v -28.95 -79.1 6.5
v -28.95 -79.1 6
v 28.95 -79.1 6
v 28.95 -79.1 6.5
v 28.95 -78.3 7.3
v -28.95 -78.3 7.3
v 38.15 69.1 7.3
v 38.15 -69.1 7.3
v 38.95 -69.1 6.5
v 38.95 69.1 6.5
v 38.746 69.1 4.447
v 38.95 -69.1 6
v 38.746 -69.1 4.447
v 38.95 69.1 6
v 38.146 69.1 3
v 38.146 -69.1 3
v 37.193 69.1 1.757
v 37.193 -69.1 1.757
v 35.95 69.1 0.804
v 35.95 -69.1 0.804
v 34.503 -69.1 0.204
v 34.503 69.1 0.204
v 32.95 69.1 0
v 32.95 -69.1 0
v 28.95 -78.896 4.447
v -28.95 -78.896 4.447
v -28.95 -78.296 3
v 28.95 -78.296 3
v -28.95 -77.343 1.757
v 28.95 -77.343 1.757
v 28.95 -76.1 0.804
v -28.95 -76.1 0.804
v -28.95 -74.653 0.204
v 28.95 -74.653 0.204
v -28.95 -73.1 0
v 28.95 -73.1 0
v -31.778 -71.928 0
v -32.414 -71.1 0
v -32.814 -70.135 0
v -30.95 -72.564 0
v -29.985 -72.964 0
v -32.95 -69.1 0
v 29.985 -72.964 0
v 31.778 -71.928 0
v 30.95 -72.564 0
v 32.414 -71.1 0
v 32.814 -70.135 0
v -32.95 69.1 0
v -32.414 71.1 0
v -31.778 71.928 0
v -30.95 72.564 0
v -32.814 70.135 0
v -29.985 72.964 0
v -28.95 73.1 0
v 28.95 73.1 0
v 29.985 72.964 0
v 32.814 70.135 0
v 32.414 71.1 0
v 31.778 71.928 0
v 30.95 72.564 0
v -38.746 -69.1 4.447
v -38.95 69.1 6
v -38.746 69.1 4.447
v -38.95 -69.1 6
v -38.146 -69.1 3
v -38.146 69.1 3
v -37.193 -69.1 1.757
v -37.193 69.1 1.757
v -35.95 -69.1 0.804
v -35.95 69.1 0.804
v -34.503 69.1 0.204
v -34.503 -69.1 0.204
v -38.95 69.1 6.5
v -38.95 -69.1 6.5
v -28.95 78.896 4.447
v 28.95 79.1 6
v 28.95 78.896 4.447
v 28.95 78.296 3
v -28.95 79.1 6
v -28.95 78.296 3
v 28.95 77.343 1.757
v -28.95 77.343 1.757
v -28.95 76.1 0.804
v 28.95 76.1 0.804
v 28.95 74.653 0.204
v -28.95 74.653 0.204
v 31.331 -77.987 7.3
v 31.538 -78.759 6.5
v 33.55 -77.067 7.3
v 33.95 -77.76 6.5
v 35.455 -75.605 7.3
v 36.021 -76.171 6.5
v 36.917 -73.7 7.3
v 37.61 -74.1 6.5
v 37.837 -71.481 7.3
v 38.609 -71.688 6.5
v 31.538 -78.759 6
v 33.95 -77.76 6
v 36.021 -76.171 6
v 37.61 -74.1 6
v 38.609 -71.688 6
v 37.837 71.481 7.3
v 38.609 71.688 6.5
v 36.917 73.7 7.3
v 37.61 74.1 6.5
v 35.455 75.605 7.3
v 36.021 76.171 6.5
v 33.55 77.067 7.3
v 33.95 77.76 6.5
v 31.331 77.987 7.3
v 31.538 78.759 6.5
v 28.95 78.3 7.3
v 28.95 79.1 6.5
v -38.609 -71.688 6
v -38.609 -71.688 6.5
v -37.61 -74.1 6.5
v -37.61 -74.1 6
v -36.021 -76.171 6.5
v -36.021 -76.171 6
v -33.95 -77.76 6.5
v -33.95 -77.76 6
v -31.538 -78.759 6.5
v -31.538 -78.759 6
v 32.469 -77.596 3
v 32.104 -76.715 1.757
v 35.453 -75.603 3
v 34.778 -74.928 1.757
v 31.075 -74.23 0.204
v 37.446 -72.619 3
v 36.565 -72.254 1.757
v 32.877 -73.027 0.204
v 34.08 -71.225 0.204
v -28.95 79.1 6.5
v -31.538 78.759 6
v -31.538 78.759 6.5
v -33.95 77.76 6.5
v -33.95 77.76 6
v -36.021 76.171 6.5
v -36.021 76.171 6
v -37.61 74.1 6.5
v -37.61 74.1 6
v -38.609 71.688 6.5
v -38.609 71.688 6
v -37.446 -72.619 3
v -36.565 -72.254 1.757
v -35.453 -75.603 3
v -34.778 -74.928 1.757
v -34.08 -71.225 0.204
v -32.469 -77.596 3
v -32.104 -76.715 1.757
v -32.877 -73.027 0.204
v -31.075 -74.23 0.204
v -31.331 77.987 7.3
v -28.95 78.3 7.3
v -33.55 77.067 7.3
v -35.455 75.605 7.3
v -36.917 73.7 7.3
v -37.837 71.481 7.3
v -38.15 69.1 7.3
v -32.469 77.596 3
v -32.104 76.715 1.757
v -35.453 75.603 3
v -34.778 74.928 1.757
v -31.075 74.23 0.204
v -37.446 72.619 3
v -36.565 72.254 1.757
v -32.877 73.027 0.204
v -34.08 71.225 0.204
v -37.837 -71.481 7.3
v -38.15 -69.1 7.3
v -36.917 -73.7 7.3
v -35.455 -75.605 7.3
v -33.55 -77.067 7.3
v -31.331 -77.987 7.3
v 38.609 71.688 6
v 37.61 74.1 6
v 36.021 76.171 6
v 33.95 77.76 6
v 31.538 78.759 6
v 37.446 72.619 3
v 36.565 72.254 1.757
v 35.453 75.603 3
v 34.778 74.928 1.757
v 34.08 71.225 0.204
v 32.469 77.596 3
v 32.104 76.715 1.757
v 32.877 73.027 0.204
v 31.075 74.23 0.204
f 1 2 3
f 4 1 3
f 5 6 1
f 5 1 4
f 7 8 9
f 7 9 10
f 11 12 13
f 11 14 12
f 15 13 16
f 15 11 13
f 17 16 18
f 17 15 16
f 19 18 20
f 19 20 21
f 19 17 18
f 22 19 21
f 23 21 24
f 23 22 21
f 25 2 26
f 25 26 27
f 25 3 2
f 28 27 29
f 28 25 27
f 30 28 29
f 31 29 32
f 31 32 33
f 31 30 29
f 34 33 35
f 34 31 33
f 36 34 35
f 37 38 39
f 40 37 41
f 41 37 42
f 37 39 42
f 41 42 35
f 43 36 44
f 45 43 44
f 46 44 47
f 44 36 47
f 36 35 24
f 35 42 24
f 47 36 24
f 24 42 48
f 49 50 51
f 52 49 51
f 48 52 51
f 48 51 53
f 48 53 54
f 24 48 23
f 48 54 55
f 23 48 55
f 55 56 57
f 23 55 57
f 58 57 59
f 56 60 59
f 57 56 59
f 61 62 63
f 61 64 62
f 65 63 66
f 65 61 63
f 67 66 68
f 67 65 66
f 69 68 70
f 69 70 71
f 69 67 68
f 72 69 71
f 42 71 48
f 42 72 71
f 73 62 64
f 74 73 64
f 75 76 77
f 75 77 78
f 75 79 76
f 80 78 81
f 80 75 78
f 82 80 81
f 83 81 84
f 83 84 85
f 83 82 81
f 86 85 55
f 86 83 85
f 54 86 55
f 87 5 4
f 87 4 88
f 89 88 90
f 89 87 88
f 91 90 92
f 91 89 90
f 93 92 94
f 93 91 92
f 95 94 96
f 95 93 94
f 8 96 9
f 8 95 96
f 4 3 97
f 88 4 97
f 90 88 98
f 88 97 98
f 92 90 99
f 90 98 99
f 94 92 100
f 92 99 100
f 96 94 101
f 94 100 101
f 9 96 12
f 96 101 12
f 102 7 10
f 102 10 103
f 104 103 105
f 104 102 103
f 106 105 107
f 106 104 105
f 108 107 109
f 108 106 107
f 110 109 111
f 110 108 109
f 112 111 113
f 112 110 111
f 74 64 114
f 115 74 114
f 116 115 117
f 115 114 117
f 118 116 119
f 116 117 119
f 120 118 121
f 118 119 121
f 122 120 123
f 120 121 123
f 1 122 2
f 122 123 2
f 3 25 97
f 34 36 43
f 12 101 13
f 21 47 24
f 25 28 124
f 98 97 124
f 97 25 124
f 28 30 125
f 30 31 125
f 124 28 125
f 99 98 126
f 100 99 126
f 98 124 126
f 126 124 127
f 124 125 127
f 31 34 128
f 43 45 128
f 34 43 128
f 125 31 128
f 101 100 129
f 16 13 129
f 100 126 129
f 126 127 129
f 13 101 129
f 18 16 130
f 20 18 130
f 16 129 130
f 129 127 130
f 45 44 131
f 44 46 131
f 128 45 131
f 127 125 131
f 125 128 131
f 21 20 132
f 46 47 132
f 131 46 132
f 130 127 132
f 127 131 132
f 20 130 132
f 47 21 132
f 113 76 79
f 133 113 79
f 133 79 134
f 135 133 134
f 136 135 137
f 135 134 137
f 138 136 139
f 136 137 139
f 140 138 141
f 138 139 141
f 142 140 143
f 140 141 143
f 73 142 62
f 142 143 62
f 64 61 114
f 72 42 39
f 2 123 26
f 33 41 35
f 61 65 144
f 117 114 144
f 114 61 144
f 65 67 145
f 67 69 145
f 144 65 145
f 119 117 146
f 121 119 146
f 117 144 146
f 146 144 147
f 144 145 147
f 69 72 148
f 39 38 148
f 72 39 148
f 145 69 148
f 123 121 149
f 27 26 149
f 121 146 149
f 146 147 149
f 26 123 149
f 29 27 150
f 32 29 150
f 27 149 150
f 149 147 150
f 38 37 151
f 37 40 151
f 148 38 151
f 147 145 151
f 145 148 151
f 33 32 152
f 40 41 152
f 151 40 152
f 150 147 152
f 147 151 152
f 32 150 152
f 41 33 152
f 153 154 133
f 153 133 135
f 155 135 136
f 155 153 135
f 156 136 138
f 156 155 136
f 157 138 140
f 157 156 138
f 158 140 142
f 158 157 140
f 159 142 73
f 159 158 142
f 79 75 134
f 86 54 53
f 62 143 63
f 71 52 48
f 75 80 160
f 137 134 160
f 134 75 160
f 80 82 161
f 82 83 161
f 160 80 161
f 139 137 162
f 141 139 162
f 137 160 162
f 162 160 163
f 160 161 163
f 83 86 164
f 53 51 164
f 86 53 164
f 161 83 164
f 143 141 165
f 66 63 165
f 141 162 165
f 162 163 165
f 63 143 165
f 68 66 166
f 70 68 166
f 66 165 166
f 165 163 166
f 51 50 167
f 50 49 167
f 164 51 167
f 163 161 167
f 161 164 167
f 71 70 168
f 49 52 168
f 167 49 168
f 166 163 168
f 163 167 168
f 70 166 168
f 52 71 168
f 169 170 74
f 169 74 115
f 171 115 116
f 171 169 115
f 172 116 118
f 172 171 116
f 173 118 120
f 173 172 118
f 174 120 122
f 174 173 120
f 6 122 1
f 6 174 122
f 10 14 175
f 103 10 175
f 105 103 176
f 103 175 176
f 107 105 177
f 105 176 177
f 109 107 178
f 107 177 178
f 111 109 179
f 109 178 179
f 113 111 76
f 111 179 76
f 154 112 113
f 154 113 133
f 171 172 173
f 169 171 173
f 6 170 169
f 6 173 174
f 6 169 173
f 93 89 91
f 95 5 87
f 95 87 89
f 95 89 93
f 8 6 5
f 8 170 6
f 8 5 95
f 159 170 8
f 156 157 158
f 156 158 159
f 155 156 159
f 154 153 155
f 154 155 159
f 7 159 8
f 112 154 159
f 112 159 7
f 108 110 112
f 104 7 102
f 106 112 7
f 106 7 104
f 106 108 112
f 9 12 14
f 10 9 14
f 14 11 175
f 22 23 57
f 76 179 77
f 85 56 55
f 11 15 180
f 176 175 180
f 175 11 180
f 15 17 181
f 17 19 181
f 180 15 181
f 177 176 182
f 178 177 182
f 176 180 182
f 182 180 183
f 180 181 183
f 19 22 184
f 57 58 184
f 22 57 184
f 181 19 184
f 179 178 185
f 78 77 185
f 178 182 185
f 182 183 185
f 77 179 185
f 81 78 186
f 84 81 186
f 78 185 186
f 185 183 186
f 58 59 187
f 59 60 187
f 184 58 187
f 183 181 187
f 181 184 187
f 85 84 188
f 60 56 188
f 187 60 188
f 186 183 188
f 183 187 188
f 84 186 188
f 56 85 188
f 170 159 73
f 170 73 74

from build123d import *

# Parameters (mm, degrees)
F1_DEPTH = 7.3
F2_R     = 6
F3_SIZE  = 0.8


with BuildPart() as f1:
    # F0 (on Top) → F1 (new body)
    with BuildSketch(Plane.XY):
        with BuildLine():
            Line((28.95, 79.1), (-28.95, 79.1))
            ThreePointArc((-28.95, 79.1), (-36.021068, 76.171068), (-38.95, 69.1))
            Line((-38.95, 69.1), (-38.95, -69.1))
            ThreePointArc((-38.95, -69.1), (-36.021068, -76.171068), (-28.95, -79.1))
            Line((-28.95, -79.1), (28.95, -79.1))
            ThreePointArc((28.95, -79.1), (36.021068, -76.171068), (38.95, -69.1))
            Line((38.95, -69.1), (38.95, 69.1))
            ThreePointArc((38.95, 69.1), (36.021068, 76.171068), (28.95, 79.1))
        make_face()
    extrude(amount=F1_DEPTH)

    # F2
    f2_edges = [f1.edges().sort_by_distance(p)[0] for p in [
        (36.021068, 76.171068, 0),
        (0, 79.1, 0),
        (-36.021068, 76.171068, 0),
        (-38.95, 0, 0),
        (-36.021068, -76.171068, 0),
        (0, -79.1, 0),
        (36.021068, -76.171068, 0),
        (38.95, 0, 0),
    ]]
    fillet(f2_edges, radius=F2_R)

    # F3
    f3_edges = [f1.edges().sort_by_distance(p)[0] for p in [
        (36.021068, 76.171068, 7.3),
        (0, 79.1, 7.3),
        (-36.021068, 76.171068, 7.3),
        (-38.95, 0, 7.3),
        (-36.021068, -76.171068, 7.3),
        (0, -79.1, 7.3),
        (36.021068, -76.171068, 7.3),
        (38.95, 0, 7.3),
    ]]
    chamfer(f3_edges, length=F3_SIZE)


solid = f1.part
